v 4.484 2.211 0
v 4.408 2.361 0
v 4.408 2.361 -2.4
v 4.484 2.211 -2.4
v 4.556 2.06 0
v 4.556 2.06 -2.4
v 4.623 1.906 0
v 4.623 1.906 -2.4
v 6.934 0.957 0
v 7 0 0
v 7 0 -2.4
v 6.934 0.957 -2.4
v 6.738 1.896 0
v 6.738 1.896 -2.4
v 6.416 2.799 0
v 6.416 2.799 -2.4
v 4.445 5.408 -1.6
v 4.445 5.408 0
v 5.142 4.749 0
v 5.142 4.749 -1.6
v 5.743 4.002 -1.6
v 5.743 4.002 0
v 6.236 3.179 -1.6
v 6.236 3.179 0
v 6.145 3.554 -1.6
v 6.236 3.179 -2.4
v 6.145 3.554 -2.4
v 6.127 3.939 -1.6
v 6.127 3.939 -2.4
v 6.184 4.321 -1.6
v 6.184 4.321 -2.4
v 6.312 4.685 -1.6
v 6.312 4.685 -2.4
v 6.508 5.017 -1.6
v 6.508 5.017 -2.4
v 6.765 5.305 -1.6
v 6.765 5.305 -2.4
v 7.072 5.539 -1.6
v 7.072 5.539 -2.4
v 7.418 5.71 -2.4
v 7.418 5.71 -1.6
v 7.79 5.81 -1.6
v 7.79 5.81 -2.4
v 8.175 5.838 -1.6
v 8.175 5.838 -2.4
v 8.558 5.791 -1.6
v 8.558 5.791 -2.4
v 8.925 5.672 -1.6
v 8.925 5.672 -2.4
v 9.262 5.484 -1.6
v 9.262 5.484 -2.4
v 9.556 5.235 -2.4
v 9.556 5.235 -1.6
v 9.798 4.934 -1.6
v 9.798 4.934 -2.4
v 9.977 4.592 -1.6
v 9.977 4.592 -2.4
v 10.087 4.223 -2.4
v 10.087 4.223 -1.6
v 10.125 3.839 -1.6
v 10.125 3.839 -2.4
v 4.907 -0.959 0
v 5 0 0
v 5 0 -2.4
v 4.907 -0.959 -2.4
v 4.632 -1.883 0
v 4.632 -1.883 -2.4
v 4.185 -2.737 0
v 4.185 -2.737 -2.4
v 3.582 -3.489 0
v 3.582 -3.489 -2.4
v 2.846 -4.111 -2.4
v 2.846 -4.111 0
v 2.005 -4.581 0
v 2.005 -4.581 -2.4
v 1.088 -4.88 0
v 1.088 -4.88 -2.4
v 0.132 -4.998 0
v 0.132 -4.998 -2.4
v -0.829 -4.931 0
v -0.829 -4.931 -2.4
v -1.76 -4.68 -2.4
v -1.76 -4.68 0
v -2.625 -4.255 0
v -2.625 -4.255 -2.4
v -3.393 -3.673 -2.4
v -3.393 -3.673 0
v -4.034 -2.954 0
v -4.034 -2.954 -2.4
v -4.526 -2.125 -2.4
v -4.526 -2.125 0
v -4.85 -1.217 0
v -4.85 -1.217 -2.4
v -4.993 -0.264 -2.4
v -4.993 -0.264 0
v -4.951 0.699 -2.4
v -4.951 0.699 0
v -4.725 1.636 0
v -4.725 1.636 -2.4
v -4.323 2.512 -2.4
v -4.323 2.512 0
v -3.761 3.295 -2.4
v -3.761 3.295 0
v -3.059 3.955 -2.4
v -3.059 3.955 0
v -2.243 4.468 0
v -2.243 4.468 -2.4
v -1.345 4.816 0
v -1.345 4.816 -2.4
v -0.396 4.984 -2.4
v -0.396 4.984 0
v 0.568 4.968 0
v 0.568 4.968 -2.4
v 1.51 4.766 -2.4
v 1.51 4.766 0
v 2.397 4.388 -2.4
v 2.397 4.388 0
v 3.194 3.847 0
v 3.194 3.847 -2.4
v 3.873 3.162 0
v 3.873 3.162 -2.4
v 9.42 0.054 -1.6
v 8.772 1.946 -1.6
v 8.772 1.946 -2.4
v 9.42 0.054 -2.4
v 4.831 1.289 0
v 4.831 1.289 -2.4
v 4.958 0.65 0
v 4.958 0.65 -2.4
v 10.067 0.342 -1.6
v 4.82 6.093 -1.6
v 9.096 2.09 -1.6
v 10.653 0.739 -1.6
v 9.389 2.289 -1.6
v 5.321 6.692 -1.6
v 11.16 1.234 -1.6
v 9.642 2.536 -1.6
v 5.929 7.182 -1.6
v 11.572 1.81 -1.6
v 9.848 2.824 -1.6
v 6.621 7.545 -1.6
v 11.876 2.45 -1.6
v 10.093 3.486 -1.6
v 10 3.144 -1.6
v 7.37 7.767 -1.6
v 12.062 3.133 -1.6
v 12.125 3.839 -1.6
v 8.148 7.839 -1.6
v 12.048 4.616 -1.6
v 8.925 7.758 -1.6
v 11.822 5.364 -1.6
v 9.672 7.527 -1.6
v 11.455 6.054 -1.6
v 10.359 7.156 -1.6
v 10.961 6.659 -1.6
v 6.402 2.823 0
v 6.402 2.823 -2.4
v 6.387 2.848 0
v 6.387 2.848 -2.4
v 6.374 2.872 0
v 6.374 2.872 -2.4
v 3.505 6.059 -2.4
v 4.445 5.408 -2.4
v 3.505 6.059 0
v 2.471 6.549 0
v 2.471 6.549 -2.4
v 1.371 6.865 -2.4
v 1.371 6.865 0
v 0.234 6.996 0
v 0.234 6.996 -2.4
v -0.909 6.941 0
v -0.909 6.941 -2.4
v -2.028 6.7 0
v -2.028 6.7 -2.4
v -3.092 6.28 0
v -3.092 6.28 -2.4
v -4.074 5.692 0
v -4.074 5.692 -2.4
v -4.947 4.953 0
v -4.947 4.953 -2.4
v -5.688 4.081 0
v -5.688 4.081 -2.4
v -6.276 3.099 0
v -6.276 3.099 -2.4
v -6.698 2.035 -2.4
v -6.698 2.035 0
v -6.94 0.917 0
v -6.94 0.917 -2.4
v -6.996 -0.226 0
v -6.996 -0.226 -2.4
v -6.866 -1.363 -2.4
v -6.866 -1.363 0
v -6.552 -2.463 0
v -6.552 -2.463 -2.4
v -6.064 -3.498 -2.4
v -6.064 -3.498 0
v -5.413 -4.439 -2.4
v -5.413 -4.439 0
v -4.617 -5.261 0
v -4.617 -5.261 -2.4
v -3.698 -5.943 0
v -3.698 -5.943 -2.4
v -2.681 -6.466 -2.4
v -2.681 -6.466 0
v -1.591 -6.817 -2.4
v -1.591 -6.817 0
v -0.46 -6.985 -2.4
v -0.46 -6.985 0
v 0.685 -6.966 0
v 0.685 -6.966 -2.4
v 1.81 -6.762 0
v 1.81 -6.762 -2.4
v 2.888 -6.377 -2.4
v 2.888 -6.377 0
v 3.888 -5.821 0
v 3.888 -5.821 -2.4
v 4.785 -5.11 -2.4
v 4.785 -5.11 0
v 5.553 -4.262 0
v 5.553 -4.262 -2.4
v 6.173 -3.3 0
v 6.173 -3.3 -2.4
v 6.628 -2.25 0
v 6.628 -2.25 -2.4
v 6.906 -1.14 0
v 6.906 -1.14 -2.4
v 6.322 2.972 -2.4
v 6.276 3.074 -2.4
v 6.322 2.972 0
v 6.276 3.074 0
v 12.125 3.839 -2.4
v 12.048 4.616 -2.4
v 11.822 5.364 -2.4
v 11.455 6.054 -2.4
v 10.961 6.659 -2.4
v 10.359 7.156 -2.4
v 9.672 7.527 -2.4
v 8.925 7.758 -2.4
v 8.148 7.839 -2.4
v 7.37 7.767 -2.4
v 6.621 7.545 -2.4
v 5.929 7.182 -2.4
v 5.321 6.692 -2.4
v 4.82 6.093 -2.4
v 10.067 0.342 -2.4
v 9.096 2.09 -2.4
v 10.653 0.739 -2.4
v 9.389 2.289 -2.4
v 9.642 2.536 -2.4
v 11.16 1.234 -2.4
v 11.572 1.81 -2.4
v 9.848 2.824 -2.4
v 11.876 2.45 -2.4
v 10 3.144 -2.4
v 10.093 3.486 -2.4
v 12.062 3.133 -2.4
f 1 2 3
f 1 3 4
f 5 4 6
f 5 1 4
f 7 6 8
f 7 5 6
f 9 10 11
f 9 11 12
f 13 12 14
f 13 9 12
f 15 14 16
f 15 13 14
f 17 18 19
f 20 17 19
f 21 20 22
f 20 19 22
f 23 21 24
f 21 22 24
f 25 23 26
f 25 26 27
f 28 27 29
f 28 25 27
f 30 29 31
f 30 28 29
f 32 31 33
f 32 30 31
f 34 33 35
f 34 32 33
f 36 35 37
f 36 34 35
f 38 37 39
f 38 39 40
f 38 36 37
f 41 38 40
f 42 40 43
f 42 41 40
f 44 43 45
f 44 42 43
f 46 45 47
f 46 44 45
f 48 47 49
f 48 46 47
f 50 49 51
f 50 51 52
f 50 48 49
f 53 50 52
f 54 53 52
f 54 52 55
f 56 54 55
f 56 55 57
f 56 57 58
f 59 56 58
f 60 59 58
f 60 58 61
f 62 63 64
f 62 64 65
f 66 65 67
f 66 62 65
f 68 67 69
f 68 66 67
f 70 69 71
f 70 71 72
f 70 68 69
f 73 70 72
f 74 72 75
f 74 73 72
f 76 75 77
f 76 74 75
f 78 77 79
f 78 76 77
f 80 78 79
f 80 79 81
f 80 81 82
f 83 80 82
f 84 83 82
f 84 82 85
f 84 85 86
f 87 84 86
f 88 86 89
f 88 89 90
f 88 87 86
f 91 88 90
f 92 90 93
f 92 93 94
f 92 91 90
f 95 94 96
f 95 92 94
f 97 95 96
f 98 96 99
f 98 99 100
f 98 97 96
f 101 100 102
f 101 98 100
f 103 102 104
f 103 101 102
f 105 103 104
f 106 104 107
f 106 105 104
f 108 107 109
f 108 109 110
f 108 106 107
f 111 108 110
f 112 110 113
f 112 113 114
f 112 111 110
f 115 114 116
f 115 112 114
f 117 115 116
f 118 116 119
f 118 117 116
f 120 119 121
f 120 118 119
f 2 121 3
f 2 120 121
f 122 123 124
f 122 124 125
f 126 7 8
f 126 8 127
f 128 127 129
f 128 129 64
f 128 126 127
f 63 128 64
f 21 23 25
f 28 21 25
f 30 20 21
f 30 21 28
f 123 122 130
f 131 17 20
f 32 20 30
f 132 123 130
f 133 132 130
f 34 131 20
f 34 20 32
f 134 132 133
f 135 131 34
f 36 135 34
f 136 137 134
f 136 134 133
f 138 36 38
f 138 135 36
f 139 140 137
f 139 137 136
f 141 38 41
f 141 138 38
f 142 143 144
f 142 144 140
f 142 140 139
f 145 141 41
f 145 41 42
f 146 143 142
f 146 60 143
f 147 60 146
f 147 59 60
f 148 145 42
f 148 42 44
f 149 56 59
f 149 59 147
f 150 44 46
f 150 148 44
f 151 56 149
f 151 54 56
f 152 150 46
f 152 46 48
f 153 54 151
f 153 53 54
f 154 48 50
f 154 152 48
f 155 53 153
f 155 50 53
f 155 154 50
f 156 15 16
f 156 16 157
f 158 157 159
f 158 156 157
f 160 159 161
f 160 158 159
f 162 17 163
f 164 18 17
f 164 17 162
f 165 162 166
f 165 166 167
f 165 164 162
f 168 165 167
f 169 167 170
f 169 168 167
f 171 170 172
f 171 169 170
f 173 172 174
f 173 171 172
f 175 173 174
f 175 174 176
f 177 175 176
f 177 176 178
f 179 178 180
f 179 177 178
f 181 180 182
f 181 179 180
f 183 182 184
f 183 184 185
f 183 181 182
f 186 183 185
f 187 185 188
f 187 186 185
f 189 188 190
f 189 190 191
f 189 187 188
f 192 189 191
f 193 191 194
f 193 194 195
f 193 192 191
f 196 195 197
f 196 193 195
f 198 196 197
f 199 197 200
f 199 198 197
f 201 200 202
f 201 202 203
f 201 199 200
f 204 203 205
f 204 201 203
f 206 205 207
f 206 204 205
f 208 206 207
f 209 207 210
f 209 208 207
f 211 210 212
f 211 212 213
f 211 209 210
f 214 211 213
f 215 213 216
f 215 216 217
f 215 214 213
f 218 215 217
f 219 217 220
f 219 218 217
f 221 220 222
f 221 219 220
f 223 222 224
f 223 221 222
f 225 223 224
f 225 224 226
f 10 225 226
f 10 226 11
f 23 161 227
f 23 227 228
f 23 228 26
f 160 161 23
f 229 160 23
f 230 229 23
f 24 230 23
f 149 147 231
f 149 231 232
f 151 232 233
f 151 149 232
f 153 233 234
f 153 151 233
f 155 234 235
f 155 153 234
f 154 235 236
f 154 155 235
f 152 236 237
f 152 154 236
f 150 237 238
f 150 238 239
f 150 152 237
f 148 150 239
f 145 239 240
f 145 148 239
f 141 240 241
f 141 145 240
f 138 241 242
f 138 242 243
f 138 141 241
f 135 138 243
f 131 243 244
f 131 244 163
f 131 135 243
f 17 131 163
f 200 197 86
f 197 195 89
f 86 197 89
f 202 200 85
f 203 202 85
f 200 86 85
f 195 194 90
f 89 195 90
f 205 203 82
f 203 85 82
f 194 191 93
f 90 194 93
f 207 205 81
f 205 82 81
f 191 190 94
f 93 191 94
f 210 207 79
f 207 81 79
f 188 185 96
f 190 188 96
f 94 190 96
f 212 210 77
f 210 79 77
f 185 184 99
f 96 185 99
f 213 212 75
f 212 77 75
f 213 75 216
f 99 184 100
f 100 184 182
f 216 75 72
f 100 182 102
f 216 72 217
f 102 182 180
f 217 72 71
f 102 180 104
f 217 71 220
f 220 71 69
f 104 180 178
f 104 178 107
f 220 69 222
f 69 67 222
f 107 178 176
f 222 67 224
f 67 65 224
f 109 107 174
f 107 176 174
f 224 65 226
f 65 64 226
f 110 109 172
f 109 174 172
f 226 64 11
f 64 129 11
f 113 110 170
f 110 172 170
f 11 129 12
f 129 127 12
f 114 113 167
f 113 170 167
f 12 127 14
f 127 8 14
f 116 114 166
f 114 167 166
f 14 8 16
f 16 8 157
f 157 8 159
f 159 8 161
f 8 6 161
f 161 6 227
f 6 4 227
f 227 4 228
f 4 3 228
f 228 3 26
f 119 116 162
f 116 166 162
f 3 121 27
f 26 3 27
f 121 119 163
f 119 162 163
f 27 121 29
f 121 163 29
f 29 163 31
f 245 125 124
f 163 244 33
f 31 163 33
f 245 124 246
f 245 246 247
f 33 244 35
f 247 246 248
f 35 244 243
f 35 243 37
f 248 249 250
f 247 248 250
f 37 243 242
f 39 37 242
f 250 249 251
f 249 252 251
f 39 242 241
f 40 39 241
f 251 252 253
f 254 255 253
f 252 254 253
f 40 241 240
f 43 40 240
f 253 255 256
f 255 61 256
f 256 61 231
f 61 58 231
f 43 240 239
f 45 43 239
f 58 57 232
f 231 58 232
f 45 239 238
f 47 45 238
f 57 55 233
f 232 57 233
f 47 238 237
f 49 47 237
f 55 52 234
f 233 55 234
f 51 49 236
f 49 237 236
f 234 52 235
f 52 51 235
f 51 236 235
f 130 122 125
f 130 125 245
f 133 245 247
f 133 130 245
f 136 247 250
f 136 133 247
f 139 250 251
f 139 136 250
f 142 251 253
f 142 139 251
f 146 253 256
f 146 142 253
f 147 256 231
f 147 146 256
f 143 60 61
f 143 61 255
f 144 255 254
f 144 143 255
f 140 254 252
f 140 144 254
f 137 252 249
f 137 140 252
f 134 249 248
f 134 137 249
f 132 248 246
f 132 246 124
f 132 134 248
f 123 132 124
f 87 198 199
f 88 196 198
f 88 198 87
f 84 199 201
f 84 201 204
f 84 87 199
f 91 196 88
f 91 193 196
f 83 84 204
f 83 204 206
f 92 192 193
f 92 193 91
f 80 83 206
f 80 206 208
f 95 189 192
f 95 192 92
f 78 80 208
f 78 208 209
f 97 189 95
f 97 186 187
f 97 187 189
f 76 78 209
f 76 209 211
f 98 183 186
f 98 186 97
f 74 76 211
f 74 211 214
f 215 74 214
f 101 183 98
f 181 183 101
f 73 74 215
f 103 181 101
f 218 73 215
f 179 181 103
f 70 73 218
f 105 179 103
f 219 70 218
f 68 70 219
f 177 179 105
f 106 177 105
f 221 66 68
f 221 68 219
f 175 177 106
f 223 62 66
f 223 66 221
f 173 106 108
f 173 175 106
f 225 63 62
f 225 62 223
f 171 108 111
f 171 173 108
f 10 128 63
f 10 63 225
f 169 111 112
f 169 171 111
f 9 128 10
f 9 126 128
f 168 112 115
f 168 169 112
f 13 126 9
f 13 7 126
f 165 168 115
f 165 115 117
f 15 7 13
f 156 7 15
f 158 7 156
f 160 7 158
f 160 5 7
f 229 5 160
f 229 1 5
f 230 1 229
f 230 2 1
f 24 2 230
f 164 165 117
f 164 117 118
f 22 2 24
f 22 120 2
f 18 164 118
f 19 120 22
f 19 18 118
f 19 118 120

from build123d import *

# Parameters (mm, degrees)
F1_DEPTH = 2.4
F2_DEPTH = 1.6


with BuildPart() as f1:
    # F0 (on Top) → F1 (new body)
    with BuildSketch(Plane.XY):
        with BuildLine():
            ThreePointArc((6.2364408078, 3.1791203265), (5.4557408837, 4.3857600721), (4.4450679147, 5.4075291247))
            ThreePointArc((4.4450679147, 5.4075291247), (4.1248628557, 3.8877917046), (4.4076455939, 2.3606482835))
            ThreePointArc((4.4076455939, 2.3606482835), (4.5207987432, 2.1359725475), (4.6225083364, 1.9058899968))
            Line((4.6225083364, 1.9058899968), (6.3735347613, 2.8722783552))
            ThreePointArc((6.3735347613, 2.8722783552), (6.2985312404, 3.0228146209), (6.2364408078, 3.1791203265))
        make_face()
        with BuildLine():
            ThreePointArc((12.1245611862, 3.8386667137), (8.9251943462, 7.7577210056), (4.4450679147, 5.4075291247))
            ThreePointArc((4.4450679147, 5.4075291247), (5.4557408837, 4.3857600721), (6.2364408078, 3.1791203265))
            ThreePointArc((6.2364408078, 3.1791203265), (7.7900770735, 5.8104984454), (10.1245611862, 3.8386667137))
            ThreePointArc((10.1245611862, 3.8386667137), (9.7517195067, 2.6757583768), (8.7722053863, 1.9464307373))
            Line((8.7722053863, 1.9464307373), (9.4198495864, 0.054194761))
            ThreePointArc((9.4198495864, 0.054194761), (11.3788778273, 1.51285004), (12.1245611862, 3.8386667137))
        make_face()
        with BuildLine():
            ThreePointArc((4.4450679147, 5.4075291247), (-6.3291182404, -2.9903615666), (7, 0))
            ThreePointArc((7, 0), (5.6226632008, 0.717688266), (4.6225083364, 1.9058899968))
            ThreePointArc((4.6225083364, 1.9058899968), (4.9047192418, 0.9714572348), (5, 0))
            ThreePointArc((5, 0), (-4.8496509137, -1.2169166016), (4.4076455939, 2.3606482835))
            ThreePointArc((4.4076455939, 2.3606482835), (4.1248628557, 3.8877917046), (4.4450679147, 5.4075291247))
        make_face()
        with BuildLine():
            ThreePointArc((4.6225083364, 1.9058899968), (5.6226632008, 0.717688266), (7, 0))
            ThreePointArc((7, 0), (6.8524662966, 1.4295823353), (6.416084099, 2.7989042203))
            ThreePointArc((6.416084099, 2.7989042203), (6.3944204178, 2.8353657012), (6.3735347613, 2.8722783552))
            Line((6.3735347613, 2.8722783552), (4.6225083364, 1.9058899968))
        make_face()
    extrude(amount=-F1_DEPTH)

    # F0 (on Top) → F2 (cut)
    with BuildSketch(Plane.XY):
        with BuildLine():
            ThreePointArc((12.1245611862, 3.8386667137), (8.9251943462, 7.7577210056), (4.4450679147, 5.4075291247))
            ThreePointArc((4.4450679147, 5.4075291247), (5.4557408837, 4.3857600721), (6.2364408078, 3.1791203265))
            ThreePointArc((6.2364408078, 3.1791203265), (7.7900770735, 5.8104984454), (10.1245611862, 3.8386667137))
            ThreePointArc((10.1245611862, 3.8386667137), (9.7517195067, 2.6757583768), (8.7722053863, 1.9464307373))
            Line((8.7722053863, 1.9464307373), (9.4198495864, 0.054194761))
            ThreePointArc((9.4198495864, 0.054194761), (11.3788778273, 1.51285004), (12.1245611862, 3.8386667137))
        make_face()
    extrude(amount=-F2_DEPTH, mode=Mode.SUBTRACT)


solid = f1.part
